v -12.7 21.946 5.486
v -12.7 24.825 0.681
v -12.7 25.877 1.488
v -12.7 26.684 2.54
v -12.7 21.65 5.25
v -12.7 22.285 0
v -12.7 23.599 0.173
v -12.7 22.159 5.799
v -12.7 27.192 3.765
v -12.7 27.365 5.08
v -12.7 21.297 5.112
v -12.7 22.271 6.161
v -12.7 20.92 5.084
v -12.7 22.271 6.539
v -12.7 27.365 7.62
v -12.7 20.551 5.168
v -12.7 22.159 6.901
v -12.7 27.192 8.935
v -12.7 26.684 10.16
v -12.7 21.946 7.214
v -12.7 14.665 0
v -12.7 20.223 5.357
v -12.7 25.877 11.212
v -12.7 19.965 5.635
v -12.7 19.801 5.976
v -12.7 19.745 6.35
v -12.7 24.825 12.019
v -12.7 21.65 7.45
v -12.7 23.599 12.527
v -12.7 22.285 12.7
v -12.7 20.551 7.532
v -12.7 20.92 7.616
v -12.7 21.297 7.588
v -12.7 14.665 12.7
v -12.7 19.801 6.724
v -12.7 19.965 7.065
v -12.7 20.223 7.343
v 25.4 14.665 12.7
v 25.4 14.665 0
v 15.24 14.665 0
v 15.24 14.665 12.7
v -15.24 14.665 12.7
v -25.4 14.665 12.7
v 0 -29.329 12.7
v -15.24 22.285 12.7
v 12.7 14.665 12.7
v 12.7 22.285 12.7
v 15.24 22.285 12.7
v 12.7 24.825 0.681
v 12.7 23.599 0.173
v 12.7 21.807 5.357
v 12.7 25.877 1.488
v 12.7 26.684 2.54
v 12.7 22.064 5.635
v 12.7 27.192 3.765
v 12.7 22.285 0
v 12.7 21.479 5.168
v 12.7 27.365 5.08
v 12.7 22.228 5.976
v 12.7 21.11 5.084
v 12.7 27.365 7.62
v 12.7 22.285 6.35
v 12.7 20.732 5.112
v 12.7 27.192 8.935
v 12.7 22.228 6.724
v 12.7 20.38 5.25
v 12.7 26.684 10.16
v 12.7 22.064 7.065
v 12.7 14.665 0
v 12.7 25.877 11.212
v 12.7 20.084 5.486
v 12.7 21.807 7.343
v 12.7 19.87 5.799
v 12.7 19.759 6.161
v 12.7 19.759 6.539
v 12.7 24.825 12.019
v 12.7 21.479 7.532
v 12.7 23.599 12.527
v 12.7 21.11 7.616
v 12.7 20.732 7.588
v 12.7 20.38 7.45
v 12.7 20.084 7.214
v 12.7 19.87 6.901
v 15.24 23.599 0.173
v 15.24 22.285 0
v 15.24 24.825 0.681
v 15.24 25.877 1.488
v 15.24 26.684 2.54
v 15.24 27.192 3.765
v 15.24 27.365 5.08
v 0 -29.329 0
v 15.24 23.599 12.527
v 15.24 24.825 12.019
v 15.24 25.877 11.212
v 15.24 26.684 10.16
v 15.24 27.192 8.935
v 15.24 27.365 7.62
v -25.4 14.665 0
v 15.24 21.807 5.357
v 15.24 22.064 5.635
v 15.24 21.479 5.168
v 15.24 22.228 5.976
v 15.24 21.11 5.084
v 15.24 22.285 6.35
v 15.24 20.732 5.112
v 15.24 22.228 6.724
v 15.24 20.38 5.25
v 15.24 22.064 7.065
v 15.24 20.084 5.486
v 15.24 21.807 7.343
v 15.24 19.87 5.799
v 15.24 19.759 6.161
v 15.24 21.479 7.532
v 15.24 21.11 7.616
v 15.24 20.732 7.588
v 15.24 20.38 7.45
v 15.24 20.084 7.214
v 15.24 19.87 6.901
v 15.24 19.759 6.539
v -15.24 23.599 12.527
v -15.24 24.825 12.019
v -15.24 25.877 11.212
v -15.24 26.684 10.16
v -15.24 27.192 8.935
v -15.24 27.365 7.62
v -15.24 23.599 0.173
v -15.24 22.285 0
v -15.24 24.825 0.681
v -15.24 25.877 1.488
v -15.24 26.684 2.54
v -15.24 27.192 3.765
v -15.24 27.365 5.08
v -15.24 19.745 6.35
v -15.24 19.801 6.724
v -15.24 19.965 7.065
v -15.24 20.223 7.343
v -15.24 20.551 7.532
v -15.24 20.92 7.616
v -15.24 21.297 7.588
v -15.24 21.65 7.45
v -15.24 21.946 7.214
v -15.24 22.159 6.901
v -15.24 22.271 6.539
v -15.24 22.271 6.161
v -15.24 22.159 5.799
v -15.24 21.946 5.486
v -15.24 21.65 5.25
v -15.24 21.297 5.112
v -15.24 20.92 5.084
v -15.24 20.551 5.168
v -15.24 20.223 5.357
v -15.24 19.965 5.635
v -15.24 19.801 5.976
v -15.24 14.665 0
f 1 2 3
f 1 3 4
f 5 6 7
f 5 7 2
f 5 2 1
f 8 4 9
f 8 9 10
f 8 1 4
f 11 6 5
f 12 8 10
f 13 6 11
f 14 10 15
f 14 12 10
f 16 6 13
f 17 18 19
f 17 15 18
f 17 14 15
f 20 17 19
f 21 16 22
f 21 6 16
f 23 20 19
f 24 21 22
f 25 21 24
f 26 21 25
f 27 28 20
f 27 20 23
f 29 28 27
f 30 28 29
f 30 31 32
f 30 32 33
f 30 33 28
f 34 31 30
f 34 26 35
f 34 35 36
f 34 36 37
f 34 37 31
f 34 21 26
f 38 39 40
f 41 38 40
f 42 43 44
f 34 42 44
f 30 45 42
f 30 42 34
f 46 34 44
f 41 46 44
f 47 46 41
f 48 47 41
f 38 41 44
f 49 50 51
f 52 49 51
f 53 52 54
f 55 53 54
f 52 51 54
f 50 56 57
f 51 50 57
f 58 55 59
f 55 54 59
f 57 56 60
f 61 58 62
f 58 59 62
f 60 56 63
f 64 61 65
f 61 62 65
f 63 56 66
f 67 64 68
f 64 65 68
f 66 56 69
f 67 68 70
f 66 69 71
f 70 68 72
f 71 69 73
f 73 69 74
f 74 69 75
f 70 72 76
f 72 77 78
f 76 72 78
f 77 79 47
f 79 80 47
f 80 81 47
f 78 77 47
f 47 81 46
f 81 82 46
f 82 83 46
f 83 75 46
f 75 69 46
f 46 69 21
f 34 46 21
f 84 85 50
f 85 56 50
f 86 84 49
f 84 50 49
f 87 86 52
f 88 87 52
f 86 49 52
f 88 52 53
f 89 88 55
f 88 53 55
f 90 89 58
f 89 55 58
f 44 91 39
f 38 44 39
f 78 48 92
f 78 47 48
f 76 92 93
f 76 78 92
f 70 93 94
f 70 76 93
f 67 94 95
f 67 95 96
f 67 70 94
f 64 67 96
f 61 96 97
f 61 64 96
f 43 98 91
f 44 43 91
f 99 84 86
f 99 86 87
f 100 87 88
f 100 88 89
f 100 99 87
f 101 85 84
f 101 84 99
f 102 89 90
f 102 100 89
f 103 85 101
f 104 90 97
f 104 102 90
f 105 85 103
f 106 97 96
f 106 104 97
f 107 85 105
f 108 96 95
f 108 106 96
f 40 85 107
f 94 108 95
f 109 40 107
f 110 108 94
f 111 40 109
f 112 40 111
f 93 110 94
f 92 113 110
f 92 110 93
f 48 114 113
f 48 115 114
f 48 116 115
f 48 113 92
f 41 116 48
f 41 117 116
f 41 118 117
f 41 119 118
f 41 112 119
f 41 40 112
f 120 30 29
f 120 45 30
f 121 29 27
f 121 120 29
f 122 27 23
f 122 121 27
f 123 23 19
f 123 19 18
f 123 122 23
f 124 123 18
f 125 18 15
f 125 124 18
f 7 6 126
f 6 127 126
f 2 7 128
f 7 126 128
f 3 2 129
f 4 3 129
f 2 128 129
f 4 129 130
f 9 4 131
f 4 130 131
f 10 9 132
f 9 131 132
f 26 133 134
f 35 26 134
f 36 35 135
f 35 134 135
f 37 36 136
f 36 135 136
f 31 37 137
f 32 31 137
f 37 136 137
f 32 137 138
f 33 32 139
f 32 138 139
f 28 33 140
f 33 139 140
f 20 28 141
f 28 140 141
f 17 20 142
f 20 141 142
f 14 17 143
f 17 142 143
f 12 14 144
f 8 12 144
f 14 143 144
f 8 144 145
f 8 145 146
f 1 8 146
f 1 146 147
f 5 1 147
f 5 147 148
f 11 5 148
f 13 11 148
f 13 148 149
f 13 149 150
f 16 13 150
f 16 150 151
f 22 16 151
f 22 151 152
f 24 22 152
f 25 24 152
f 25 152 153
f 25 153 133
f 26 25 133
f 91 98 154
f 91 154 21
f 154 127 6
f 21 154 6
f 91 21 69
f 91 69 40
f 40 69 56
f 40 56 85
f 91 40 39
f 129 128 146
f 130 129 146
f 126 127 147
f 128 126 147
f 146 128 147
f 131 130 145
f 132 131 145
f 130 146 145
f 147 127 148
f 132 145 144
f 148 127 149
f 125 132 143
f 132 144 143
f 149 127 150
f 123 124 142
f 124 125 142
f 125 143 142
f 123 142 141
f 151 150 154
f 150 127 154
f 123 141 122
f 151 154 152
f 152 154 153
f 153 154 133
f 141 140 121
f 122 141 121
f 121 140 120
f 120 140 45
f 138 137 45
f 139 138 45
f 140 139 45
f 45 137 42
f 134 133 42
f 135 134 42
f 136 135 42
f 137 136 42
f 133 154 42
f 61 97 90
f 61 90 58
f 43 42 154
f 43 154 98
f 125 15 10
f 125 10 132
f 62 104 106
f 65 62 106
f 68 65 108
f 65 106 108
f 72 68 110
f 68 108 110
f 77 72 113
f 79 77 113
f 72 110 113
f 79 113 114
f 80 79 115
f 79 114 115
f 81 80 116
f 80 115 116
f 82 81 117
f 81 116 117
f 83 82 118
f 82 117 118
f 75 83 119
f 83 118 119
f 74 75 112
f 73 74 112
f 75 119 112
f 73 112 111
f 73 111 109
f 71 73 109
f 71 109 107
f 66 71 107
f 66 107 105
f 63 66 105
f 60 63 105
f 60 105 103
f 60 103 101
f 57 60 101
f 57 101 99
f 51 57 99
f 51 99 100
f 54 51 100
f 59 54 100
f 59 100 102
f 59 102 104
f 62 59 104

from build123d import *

# Parameters (mm, degrees)
F1_DEPTH = 12.7
F2_W     = 2.54
F2_H     = 12.7
F3_DEPTH = 12.7
F4_R     = 1.27
F5_DEPTH = 25.4
F6_R     = 1.27
F7_DEPTH = 25.4
F8_R     = 5.08


with BuildPart() as f1:
    # F0 (on Top) → F1 (new body)
    with BuildSketch(Plane.XY):
        Polygon((-25.4, 14.664697), (0, -29.329394), (25.4, 14.664697), align=None)
    extrude(amount=F1_DEPTH)

    # F2 (on face) → F3 (join)
    with BuildSketch(Plane(origin=(0, 14.664697, 0), x_dir=(-1, 0, 0), z_dir=(0, 1, 0))):
        with Locations((-13.97, 6.35)):
            Rectangle(F2_W, F2_H)
        with Locations((13.97, 6.35)):
            Rectangle(F2_W, F2_H)
    extrude(amount=F3_DEPTH)

    # F4 (on face) → F5 (cut)
    with BuildSketch(Plane.YZ.offset(15.24)):
        with Locations((21.014697, 6.35)):
            Circle(F4_R)
    extrude(amount=-F5_DEPTH, mode=Mode.SUBTRACT)

    # F6 (on face) → F7 (cut)
    with BuildSketch(Plane(origin=(-15.24, 0, 0), x_dir=(0, -1, 0), z_dir=(-1, 0, 0))):
        with Locations((-21.014697, 6.35)):
            Circle(F6_R)
    extrude(amount=-F7_DEPTH, mode=Mode.SUBTRACT)

    # F8
    f8_edges = [f1.edges().sort_by_distance(p)[0] for p in [
        (13.97, 27.364697, 12.7),
        (13.97, 27.364697, 0),
        (-13.97, 27.364697, 12.7),
        (-13.97, 27.364697, 0),
    ]]
    fillet(f8_edges, radius=F8_R)


solid = f1.part
